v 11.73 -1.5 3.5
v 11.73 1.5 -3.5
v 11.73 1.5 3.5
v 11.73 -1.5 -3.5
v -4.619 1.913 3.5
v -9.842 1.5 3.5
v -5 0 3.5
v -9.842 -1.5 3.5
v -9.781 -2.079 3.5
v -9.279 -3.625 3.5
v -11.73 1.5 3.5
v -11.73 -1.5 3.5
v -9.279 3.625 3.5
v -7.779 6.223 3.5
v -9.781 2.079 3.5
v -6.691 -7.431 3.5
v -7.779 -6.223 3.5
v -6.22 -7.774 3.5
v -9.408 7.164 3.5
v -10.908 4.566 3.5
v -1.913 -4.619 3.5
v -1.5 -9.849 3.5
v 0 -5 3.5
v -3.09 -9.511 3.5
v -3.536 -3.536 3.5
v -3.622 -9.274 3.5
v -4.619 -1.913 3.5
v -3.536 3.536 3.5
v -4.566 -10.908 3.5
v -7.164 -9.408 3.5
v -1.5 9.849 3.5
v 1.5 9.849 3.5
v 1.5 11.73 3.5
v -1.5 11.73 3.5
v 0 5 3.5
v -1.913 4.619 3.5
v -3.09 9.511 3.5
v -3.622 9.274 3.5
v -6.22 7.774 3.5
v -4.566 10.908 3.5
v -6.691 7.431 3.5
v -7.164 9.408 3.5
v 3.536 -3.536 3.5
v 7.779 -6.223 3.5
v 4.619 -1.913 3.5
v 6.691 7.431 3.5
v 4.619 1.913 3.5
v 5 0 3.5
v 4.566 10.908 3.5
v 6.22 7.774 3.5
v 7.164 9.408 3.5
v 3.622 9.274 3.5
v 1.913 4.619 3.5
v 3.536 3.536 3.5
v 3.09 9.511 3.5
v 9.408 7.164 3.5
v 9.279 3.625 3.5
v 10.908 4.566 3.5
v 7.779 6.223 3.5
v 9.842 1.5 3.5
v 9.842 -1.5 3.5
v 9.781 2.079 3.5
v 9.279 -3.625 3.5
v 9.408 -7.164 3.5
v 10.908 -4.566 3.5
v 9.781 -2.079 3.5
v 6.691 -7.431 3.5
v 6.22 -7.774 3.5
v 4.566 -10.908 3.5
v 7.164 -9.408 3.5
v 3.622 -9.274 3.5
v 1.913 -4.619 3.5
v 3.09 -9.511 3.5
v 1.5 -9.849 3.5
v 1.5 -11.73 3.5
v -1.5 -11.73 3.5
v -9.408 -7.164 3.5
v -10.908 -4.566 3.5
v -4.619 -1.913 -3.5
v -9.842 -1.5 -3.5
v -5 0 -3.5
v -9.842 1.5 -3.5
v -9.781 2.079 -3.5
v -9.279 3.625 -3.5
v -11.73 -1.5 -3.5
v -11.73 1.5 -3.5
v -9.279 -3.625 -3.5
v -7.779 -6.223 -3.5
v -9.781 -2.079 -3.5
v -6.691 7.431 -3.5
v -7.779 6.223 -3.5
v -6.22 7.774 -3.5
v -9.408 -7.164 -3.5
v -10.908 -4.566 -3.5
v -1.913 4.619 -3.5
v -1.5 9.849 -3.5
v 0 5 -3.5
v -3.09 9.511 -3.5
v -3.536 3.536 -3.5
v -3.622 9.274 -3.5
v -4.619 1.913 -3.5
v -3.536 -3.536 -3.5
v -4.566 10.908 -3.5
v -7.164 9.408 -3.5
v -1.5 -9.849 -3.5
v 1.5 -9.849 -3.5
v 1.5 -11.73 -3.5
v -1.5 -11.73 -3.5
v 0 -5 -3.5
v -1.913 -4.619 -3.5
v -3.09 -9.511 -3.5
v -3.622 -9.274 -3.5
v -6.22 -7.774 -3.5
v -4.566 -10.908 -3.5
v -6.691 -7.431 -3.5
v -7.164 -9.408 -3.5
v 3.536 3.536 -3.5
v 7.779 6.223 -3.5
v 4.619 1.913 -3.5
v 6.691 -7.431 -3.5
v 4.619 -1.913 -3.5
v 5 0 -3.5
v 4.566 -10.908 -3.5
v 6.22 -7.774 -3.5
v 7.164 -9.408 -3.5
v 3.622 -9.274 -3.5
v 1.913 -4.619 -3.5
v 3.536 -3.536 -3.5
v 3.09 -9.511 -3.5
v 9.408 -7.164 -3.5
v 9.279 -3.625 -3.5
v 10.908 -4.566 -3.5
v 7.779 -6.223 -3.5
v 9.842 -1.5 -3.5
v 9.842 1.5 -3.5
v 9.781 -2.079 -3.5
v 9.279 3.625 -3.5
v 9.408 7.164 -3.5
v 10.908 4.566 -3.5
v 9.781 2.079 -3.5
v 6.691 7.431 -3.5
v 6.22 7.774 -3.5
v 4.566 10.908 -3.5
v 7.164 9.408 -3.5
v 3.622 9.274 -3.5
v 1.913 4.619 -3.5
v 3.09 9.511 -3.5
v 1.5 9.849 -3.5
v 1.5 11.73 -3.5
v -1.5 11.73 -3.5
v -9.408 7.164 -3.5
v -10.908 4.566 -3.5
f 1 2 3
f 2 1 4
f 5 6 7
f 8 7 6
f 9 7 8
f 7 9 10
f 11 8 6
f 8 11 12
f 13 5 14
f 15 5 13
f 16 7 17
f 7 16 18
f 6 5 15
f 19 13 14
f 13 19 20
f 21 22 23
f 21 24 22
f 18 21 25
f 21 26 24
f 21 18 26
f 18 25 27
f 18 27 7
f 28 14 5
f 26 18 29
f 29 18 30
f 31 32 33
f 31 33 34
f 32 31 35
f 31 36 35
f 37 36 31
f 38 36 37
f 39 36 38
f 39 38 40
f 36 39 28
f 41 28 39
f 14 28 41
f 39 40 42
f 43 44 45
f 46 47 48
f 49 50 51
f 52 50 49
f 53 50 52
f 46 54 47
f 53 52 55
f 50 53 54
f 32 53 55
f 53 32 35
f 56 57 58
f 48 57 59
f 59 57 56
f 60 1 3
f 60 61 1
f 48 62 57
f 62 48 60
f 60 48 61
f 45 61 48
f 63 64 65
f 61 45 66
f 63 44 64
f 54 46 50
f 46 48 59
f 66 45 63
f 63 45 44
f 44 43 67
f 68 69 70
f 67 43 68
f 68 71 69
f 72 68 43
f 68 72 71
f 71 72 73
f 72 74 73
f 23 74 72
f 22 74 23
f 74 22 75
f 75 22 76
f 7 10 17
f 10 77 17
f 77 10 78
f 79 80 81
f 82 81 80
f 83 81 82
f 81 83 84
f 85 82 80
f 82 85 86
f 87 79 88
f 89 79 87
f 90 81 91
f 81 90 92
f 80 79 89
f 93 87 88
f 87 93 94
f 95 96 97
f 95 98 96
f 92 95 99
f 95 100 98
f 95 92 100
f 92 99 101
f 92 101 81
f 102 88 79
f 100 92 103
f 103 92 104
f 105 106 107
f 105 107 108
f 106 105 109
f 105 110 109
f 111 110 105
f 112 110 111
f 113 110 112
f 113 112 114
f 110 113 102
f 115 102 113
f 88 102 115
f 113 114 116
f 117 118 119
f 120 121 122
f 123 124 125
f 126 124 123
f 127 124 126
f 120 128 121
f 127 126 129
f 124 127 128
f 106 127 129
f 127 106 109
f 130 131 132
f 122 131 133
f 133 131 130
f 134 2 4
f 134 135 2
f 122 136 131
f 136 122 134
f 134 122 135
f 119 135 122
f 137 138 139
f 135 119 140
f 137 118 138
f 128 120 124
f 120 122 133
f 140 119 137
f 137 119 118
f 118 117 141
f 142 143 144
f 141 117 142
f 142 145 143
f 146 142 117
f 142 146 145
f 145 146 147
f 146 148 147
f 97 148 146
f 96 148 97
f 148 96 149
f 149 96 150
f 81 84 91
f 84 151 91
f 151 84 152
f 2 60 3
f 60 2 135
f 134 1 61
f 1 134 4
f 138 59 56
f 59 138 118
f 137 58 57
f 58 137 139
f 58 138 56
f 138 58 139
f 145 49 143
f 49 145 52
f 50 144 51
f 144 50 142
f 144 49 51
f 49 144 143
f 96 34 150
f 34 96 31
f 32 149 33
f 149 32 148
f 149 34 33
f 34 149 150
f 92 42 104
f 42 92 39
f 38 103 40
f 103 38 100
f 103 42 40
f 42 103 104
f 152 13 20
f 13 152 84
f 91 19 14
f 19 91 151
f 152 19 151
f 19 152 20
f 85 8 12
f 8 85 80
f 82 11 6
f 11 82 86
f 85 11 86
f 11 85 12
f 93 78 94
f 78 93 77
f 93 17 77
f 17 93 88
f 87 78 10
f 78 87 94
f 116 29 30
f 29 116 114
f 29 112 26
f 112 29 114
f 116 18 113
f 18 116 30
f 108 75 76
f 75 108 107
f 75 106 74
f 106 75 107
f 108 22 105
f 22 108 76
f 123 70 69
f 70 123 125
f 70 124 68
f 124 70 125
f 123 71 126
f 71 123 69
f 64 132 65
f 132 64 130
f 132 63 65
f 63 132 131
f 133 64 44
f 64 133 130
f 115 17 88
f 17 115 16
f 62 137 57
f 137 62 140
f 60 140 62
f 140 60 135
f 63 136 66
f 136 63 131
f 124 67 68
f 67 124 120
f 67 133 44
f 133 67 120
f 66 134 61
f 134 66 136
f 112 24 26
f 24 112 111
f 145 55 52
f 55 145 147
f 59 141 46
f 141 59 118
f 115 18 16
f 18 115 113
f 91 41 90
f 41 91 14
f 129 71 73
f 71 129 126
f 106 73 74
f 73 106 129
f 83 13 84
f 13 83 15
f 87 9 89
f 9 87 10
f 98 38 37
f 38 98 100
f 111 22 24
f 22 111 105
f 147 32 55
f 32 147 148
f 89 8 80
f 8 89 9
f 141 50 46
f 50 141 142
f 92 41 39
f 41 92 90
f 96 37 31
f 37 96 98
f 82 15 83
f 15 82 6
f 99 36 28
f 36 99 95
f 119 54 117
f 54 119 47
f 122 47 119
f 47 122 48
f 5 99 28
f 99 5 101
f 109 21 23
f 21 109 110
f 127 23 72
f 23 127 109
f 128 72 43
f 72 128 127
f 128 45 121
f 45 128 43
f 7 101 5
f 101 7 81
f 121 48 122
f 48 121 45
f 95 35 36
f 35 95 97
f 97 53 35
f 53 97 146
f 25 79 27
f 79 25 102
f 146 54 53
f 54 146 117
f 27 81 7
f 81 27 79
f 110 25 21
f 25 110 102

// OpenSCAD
// Parameters
bbox_xy = 23.46; //[11.73:46.92:0.01]
thickness = 7; //[3.5:14:0.1]
outer_diameter_max = 23.46; //[11.73:46.92:0.01]
bore_diameter = 10; //[5:20:0.1]
root_diameter = 20; //[12:23.46:0.1]
tooth_count = 12; //[6:36:2]
tooth_radial_height = 1.73; //[0.5:3.46:0.01]
tooth_tangential_width = 3; //[1.5:6:0.1]
overlap = 0.8; //[0.2:2:0.1]
chamfer_size = 0.6; //[0:1.5:0.1]
fillet_radius = 0.6; //[0:1.5:0.1]
tooth_tip_chamfer = 0.4; //[0:1.2:0.1]

// Helper function to create a tooth
module tooth() {
  translate([min(root_diameter/2, outer_diameter_max/2 - tooth_radial_height) + (tooth_radial_height + overlap)/2 - overlap, 0, 0])
    cube([tooth_radial_height + overlap, tooth_tangential_width, thickness], center=true);
}

// Main module
module final_ring_with_bore() {
  difference() {
    union() {
      // Annular main body
      cylinder(h=thickness, r=min(root_diameter/2, outer_diameter_max/2 - tooth_radial_height), center=true);
      
      // Outer tooth lug array
      for (i = [0:tooth_count-1]) {
        rotate([0, 0, i * 360/tooth_count])
          tooth();
      }
    }
    
    // Central through bore
    cylinder(h=thickness + 2*overlap, r=bore_diameter/2, center=true);
  }
}

// Render the final output
color("Silver") final_ring_with_bore();
